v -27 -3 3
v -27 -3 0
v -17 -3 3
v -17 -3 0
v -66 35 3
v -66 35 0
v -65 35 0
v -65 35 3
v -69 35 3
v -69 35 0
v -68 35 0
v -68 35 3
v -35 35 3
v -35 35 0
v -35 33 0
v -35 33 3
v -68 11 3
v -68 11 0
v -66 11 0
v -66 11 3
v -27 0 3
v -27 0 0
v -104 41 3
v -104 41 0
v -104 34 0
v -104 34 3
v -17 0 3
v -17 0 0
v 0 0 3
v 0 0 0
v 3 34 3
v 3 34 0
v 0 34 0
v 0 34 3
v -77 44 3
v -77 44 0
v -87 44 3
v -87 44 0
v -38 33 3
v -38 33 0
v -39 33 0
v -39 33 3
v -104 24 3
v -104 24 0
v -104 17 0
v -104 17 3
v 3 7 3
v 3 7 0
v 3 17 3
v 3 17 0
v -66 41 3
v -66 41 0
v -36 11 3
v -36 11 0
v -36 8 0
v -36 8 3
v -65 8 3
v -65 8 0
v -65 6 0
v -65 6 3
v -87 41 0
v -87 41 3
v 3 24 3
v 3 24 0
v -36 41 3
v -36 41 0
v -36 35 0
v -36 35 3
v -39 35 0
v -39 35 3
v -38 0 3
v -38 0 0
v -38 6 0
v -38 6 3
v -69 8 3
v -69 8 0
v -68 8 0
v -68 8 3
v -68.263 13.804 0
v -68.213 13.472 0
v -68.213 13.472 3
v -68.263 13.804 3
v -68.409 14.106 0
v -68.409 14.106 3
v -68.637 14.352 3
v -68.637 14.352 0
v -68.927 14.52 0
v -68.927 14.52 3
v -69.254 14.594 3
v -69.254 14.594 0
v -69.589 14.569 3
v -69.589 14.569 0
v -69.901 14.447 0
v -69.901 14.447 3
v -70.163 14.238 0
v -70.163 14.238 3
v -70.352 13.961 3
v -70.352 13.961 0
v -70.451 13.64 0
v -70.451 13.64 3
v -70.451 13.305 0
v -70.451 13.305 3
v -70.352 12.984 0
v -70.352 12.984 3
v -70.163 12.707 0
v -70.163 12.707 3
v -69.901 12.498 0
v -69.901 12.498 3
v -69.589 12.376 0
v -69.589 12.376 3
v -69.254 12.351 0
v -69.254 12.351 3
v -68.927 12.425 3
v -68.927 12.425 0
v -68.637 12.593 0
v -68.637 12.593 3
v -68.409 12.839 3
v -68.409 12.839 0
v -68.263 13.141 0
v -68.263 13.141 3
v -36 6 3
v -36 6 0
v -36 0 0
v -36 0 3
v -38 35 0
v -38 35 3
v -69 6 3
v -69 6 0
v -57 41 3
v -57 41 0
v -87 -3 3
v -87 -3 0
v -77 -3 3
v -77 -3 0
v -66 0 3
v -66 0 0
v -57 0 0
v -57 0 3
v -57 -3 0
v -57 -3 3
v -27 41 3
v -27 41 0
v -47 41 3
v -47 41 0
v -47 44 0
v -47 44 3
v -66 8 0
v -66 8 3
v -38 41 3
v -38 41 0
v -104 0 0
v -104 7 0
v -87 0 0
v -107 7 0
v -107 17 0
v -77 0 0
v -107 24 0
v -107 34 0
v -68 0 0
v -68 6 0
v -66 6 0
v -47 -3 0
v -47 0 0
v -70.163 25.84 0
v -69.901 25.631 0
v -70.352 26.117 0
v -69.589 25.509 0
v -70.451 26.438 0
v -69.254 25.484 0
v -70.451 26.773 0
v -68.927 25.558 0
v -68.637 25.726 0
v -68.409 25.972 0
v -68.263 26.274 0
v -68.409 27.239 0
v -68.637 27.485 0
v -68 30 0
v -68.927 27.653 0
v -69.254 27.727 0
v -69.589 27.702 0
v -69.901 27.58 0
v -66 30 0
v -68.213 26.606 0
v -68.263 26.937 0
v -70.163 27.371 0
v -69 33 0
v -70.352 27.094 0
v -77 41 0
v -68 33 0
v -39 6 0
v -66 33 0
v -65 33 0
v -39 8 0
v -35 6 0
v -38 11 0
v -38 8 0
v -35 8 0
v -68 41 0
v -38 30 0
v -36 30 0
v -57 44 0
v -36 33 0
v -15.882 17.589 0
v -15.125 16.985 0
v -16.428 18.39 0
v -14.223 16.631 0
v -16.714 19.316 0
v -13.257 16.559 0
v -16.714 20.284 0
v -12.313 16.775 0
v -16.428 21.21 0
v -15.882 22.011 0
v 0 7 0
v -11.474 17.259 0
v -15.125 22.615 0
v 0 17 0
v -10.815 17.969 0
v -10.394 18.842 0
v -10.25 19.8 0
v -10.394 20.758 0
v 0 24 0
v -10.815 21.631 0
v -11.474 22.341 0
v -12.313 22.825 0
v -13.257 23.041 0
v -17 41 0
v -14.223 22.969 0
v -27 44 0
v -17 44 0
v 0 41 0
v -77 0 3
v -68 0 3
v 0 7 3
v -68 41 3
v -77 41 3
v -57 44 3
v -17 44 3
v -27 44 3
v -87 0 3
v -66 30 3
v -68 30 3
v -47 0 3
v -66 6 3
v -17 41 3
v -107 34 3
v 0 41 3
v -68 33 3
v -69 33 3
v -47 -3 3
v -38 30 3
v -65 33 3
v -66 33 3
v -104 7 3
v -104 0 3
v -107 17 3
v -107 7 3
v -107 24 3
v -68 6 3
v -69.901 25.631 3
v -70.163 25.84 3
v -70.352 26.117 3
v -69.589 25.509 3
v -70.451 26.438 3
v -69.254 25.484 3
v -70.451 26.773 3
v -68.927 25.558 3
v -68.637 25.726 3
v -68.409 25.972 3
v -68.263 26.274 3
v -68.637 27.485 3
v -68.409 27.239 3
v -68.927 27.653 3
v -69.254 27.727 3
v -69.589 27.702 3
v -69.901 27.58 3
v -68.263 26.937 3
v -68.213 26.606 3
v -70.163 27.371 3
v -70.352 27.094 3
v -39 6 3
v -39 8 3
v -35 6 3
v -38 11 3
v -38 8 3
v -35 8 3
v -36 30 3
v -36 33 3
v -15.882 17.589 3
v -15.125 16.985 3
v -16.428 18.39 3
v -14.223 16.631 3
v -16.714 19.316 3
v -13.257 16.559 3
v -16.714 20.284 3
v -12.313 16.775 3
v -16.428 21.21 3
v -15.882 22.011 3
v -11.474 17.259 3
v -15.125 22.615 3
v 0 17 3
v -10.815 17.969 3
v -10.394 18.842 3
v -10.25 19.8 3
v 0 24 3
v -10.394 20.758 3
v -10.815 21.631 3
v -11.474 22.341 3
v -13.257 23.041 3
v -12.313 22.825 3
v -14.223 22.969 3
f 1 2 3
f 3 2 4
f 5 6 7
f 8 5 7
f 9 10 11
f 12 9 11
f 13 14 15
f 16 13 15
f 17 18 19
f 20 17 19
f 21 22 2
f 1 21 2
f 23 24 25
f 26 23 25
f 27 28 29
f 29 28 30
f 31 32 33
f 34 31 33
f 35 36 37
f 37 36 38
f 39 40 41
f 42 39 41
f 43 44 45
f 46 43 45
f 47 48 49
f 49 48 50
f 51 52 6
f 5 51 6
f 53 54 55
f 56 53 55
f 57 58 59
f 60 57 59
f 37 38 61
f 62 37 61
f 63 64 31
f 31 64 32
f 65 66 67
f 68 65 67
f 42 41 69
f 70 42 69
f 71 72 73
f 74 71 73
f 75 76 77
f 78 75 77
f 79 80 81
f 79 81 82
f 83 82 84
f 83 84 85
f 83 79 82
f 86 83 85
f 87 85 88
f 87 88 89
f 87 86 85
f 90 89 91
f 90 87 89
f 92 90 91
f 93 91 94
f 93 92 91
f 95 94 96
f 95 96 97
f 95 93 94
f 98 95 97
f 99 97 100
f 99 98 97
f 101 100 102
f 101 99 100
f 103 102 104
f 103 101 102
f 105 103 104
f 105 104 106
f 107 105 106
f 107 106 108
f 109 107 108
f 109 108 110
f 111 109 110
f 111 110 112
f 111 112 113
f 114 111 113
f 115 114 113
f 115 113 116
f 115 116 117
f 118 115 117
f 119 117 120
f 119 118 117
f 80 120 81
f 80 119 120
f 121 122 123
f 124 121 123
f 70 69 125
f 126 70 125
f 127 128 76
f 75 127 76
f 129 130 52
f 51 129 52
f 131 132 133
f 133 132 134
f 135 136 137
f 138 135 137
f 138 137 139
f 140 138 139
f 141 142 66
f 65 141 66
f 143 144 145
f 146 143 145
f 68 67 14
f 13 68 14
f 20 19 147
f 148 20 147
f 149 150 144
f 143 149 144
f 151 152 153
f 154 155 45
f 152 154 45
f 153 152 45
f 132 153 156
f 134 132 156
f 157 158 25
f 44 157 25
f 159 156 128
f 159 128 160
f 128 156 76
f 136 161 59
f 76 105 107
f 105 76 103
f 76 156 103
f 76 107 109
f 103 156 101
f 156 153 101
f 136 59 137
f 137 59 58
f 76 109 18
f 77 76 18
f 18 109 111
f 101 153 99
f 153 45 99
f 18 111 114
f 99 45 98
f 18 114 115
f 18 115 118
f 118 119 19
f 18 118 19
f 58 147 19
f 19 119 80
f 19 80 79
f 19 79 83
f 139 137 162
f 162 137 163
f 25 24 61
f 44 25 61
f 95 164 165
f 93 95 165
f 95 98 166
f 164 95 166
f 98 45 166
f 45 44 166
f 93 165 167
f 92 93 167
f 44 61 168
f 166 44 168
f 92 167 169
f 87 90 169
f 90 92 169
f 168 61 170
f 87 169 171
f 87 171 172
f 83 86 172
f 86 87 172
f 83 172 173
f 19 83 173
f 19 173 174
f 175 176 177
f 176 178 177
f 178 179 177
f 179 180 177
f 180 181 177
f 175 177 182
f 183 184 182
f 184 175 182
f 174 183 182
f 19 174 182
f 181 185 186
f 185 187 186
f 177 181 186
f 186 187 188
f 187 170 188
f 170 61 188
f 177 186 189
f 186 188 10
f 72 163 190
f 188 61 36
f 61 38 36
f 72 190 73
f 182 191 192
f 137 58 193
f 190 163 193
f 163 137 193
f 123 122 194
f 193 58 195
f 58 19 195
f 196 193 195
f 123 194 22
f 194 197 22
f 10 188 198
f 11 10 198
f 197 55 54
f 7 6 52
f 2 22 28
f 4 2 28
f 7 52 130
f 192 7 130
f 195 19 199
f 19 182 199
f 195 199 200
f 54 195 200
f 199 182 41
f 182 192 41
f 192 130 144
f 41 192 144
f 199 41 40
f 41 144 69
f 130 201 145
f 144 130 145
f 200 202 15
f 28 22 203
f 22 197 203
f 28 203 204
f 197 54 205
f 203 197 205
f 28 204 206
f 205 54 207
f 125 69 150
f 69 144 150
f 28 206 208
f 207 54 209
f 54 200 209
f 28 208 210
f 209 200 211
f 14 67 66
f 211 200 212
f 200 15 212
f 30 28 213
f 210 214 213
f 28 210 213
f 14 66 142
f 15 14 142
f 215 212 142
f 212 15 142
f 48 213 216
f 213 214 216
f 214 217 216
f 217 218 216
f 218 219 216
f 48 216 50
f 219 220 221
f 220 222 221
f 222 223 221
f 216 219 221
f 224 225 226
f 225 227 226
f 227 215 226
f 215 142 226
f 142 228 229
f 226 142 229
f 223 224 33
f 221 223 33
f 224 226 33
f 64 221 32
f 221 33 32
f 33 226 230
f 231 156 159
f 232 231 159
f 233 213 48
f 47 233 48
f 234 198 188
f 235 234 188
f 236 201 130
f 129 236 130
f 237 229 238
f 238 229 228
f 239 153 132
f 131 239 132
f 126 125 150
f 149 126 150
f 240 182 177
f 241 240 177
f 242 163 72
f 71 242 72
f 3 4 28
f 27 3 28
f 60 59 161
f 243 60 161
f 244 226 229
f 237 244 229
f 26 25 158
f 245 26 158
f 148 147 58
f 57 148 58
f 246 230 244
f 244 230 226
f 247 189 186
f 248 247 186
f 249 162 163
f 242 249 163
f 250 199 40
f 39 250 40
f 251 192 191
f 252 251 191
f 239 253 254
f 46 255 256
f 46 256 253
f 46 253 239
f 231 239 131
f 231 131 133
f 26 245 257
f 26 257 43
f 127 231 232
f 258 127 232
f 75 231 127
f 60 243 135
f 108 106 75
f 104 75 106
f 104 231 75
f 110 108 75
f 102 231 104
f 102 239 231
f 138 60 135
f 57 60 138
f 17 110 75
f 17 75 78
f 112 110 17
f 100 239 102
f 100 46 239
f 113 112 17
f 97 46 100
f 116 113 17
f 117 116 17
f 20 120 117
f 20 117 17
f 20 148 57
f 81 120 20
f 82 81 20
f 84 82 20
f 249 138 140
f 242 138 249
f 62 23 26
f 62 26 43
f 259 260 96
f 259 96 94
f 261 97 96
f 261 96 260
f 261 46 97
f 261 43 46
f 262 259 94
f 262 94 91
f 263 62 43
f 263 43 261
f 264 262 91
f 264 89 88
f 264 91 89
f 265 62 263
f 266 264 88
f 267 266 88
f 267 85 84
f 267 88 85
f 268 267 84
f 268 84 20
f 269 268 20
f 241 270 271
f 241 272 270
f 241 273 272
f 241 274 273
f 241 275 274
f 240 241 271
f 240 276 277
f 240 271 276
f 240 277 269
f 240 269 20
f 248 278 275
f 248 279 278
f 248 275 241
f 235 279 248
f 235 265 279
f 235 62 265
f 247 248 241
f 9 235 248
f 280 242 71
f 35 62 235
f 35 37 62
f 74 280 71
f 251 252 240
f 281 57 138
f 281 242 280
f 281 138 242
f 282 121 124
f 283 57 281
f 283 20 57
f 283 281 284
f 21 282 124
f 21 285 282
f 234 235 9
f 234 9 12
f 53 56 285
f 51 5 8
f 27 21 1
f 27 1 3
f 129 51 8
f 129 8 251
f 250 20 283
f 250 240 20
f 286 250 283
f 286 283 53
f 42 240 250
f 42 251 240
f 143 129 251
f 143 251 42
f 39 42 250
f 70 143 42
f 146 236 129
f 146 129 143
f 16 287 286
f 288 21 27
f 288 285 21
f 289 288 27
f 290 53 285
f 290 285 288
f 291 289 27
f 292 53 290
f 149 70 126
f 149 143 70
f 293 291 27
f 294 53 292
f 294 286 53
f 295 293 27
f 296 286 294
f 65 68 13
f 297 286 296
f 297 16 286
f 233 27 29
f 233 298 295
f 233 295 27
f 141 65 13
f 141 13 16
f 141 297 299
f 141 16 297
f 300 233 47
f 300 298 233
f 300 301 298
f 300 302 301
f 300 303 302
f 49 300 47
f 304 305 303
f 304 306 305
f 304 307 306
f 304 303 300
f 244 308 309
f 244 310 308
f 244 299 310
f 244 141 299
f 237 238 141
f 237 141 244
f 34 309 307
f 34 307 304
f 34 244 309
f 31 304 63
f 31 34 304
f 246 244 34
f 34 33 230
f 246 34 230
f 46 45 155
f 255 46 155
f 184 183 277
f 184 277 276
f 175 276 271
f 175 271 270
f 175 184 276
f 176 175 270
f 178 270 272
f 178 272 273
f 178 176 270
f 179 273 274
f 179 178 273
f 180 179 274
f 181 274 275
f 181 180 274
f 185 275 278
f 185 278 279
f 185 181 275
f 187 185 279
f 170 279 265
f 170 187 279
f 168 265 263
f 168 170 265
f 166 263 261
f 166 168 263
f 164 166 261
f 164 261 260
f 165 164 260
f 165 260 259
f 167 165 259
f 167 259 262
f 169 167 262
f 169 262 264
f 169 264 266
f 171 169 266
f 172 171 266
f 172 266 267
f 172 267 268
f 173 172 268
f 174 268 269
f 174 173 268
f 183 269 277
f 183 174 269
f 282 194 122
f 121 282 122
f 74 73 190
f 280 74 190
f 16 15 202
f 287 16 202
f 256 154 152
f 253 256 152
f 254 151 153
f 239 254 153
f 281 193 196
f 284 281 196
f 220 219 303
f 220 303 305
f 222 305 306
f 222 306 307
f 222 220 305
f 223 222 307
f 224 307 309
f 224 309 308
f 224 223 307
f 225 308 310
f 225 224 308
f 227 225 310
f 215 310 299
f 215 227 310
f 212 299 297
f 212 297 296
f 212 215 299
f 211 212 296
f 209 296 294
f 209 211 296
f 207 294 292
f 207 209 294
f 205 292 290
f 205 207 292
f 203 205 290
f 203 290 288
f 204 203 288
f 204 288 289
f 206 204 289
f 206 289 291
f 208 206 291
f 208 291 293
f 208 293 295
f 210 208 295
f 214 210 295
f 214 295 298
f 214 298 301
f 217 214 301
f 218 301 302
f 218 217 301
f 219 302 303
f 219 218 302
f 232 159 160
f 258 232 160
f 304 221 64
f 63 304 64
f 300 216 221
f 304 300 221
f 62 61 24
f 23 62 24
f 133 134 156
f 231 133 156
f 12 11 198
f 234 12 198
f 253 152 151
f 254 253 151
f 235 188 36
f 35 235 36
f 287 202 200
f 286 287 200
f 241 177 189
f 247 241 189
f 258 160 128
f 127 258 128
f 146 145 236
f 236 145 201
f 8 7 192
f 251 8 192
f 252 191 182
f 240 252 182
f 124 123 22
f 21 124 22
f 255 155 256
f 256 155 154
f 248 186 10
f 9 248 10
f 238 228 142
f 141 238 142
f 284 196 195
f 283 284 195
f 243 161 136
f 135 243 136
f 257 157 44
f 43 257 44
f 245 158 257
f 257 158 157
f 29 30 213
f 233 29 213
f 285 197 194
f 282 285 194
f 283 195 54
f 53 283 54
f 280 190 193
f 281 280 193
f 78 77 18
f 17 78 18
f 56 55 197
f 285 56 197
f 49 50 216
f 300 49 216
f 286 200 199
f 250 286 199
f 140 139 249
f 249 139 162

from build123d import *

# Parameters (mm, degrees)
F0_R     = 1.125
F0_R_2   = 3.25
F1_DEPTH = 3


with BuildPart() as f1:
    # F0 (on Top) → F1 (new body)
    with BuildSketch(Plane.XY):
        Polygon((-17, 0), (0, 0), (0, 7), (3, 7), (3, 17), (0, 17), (0, 24), (3, 24), (3, 34), (0, 34), (0, 41), (-17, 41), (-17, 44), (-27, 44), (-27, 41), (-36, 41), (-36, 35), (-35, 35), (-35, 33), (-36, 33), (-36, 30), (-38, 30), (-38, 33), (-39, 33), (-39, 35), (-38, 35), (-38, 41), (-47, 41), (-47, 44), (-57, 44), (-57, 41), (-66, 41), (-66, 35), (-65, 35), (-65, 33), (-66, 33), (-66, 30), (-68, 30), (-68, 33), (-69, 33), (-69, 35), (-68, 35), (-68, 41), (-77, 41), (-77, 44), (-87, 44), (-87, 41), (-104, 41), (-104, 34), (-107, 34), (-107, 24), (-104, 24), (-104, 17), (-107, 17), (-107, 7), (-104, 7), (-104, 0), (-87, 0), (-87, -3), (-77, -3), (-77, 0), (-68, 0), (-68, 6), (-69, 6), (-69, 8), (-68, 8), (-68, 11), (-66, 11), (-66, 8), (-65, 8), (-65, 6), (-66, 6), (-66, 0), (-57, 0), (-57, -3), (-47, -3), (-47, 0), (-38, 0), (-38, 6), (-39, 6), (-39, 8), (-38, 8), (-38, 11), (-36, 11), (-36, 8), (-35, 8), (-35, 6), (-36, 6), (-36, 0), (-27, 0), (-27, -3), (-17, -3), align=None)
        with Locations((-69.33824, 13.472463)):
            Circle(F0_R, mode=Mode.SUBTRACT)
        with Locations((-13.5, 19.8)):
            Circle(F0_R_2, mode=Mode.SUBTRACT)
        with Locations((-69.33824, 26.605537)):
            Circle(F0_R, mode=Mode.SUBTRACT)
    extrude(amount=F1_DEPTH)


solid = f1.part
